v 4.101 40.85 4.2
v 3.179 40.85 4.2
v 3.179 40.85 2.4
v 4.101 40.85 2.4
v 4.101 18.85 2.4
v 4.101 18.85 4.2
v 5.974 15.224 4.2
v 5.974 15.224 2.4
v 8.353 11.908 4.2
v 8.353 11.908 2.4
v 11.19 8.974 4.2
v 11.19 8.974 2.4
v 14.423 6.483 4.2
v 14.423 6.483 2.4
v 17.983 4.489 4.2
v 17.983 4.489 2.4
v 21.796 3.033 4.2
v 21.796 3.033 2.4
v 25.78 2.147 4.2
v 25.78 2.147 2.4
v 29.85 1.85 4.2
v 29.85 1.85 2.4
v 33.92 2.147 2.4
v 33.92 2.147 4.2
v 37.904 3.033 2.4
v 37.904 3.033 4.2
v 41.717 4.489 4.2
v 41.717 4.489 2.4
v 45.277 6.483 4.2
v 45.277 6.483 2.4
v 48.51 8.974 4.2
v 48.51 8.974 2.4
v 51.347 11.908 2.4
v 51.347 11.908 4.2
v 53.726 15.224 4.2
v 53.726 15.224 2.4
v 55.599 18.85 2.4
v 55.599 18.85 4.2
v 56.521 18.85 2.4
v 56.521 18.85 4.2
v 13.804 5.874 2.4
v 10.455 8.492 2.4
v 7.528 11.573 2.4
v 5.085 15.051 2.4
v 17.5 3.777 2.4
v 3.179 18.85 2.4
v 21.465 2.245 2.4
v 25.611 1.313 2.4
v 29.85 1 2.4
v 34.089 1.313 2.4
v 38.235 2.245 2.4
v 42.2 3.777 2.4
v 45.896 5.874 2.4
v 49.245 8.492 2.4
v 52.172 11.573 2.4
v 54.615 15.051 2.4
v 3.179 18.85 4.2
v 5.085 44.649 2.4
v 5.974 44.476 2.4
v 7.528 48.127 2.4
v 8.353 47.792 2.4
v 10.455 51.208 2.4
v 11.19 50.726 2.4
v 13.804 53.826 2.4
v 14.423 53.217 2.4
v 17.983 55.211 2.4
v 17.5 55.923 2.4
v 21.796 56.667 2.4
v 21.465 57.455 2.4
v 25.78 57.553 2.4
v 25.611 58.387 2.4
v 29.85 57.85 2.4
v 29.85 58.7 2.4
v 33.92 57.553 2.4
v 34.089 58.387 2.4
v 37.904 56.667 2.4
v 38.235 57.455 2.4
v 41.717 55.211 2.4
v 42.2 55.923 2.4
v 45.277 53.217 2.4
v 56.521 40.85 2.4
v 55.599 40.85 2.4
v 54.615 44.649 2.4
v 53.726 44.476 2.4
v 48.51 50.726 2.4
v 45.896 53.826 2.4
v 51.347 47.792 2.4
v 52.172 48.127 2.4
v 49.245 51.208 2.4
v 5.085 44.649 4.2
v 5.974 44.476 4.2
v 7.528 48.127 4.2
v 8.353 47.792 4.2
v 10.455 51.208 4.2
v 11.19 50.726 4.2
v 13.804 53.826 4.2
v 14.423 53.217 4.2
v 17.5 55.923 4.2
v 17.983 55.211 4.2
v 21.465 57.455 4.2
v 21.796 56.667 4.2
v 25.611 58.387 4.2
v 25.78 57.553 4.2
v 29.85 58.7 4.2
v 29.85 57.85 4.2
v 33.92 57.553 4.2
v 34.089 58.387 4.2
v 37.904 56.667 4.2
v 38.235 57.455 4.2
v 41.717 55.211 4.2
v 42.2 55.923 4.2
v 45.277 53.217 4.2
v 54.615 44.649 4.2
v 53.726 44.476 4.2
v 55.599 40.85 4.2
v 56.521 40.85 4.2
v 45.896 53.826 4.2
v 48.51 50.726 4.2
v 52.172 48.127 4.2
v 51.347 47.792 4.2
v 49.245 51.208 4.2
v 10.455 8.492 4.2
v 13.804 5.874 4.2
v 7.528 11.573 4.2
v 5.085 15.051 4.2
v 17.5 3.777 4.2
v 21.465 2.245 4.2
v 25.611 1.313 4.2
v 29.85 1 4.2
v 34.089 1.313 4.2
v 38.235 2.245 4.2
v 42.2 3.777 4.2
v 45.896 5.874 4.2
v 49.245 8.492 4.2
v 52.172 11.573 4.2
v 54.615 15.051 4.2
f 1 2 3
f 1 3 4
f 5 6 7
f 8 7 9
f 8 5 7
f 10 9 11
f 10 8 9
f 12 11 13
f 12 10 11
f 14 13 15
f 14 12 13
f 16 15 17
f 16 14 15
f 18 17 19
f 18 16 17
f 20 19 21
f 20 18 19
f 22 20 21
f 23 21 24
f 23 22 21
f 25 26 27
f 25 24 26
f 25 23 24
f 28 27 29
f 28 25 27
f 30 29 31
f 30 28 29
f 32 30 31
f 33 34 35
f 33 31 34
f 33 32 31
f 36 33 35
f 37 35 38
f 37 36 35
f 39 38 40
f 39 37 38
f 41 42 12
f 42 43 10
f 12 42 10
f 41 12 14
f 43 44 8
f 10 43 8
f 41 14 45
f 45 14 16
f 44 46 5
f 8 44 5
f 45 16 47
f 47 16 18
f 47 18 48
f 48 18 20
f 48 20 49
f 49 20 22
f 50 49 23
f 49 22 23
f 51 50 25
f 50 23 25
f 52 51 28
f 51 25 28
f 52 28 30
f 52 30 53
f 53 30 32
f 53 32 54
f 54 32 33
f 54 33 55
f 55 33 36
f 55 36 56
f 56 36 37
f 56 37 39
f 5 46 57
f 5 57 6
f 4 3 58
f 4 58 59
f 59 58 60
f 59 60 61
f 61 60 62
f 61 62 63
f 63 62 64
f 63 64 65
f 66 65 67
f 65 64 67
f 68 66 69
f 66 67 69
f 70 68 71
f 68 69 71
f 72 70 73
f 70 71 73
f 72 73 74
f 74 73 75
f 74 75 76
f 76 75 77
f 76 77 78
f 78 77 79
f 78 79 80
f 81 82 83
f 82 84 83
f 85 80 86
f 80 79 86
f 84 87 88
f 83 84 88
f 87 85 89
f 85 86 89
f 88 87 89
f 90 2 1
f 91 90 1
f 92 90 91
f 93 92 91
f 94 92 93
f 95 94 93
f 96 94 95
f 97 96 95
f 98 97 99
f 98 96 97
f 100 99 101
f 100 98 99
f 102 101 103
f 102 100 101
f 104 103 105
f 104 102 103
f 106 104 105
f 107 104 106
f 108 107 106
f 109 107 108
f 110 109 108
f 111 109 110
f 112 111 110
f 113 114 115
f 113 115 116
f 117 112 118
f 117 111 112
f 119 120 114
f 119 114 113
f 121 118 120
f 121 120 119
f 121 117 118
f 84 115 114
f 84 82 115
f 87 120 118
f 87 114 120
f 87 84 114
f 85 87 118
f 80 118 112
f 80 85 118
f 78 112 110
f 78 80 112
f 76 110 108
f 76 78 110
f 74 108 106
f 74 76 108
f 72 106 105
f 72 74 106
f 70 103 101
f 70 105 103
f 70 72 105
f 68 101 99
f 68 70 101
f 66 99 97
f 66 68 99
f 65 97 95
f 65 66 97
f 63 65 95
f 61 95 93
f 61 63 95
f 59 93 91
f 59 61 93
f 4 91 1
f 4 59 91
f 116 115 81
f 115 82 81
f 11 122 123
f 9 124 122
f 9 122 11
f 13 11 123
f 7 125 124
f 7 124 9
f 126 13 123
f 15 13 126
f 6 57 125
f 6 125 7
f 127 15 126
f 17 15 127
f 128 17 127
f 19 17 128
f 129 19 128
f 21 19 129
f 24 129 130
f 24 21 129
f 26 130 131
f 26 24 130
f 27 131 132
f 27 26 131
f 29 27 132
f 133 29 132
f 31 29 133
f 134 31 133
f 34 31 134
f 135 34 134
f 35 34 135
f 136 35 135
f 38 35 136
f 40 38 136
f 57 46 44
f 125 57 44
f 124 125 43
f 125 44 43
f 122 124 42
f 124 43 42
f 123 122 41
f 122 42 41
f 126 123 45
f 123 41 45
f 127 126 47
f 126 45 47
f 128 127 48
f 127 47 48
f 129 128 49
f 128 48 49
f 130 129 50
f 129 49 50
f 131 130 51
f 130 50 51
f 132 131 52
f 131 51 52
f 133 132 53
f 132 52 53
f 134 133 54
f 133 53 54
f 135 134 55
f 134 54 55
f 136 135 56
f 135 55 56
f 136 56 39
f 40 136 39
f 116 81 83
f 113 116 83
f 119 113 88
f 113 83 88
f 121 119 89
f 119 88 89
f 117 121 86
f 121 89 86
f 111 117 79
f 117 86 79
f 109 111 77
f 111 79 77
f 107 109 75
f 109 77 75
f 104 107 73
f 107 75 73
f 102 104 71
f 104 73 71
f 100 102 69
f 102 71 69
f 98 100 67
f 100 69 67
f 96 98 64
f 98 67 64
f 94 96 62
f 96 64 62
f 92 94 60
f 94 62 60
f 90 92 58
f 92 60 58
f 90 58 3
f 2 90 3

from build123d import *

# Parameters (mm, degrees)
BOX003_W          = 5
BOX003_H          = 22
BOX003_DEPTH      = 2.5
BOX002_W          = 5
BOX002_H          = 22
BOX002_DEPTH      = 2.5
CYLINDER001_R     = 28
CYLINDER001_DEPTH = 1.8
CYLINDER_R        = 28.85
CYLINDER_DEPTH    = 1.8


with BuildPart() as box003:
    # Box003 → Box003 (new body)
    with BuildSketch(Plane(origin=(54.7, 18.85, 1.9), x_dir=(1, 0, 0), z_dir=(0, 0, 1))):
        with Locations((2.5, 11)):
            Rectangle(BOX003_W, BOX003_H)
    extrude(amount=BOX003_DEPTH)


with BuildPart() as box002:
    # Box002 → Box002 (new body)
    with BuildSketch(Plane(origin=(0, 18.85, 1.9), x_dir=(1, 0, 0), z_dir=(0, 0, 1))):
        with Locations((2.5, 11)):
            Rectangle(BOX002_W, BOX002_H)
    extrude(amount=BOX002_DEPTH)


with BuildPart() as cylinder_inside:
    # Cylinder001 → Cylinder001 (new body)
    with BuildSketch(Plane(origin=(29.85, 29.85, 2.4), x_dir=(1, 0, 0), z_dir=(0, 0, 1))):
        Circle(CYLINDER001_R)
    extrude(amount=CYLINDER001_DEPTH)


with BuildPart() as cylinder:
    # Cylinder → Cylinder (new body)
    with BuildSketch(Plane(origin=(29.85, 29.85, 2.4), x_dir=(1, 0, 0), z_dir=(0, 0, 1))):
        Circle(CYLINDER_R)
    extrude(amount=CYLINDER_DEPTH)

    # Cut: cut Cylinder_Inside
    add(cylinder_inside.part, mode=Mode.SUBTRACT)

    # Cut001: cut Box002
    add(box002.part, mode=Mode.SUBTRACT)

    # Cut002: cut Box003
    add(box003.part, mode=Mode.SUBTRACT)


solid = cylinder.part
